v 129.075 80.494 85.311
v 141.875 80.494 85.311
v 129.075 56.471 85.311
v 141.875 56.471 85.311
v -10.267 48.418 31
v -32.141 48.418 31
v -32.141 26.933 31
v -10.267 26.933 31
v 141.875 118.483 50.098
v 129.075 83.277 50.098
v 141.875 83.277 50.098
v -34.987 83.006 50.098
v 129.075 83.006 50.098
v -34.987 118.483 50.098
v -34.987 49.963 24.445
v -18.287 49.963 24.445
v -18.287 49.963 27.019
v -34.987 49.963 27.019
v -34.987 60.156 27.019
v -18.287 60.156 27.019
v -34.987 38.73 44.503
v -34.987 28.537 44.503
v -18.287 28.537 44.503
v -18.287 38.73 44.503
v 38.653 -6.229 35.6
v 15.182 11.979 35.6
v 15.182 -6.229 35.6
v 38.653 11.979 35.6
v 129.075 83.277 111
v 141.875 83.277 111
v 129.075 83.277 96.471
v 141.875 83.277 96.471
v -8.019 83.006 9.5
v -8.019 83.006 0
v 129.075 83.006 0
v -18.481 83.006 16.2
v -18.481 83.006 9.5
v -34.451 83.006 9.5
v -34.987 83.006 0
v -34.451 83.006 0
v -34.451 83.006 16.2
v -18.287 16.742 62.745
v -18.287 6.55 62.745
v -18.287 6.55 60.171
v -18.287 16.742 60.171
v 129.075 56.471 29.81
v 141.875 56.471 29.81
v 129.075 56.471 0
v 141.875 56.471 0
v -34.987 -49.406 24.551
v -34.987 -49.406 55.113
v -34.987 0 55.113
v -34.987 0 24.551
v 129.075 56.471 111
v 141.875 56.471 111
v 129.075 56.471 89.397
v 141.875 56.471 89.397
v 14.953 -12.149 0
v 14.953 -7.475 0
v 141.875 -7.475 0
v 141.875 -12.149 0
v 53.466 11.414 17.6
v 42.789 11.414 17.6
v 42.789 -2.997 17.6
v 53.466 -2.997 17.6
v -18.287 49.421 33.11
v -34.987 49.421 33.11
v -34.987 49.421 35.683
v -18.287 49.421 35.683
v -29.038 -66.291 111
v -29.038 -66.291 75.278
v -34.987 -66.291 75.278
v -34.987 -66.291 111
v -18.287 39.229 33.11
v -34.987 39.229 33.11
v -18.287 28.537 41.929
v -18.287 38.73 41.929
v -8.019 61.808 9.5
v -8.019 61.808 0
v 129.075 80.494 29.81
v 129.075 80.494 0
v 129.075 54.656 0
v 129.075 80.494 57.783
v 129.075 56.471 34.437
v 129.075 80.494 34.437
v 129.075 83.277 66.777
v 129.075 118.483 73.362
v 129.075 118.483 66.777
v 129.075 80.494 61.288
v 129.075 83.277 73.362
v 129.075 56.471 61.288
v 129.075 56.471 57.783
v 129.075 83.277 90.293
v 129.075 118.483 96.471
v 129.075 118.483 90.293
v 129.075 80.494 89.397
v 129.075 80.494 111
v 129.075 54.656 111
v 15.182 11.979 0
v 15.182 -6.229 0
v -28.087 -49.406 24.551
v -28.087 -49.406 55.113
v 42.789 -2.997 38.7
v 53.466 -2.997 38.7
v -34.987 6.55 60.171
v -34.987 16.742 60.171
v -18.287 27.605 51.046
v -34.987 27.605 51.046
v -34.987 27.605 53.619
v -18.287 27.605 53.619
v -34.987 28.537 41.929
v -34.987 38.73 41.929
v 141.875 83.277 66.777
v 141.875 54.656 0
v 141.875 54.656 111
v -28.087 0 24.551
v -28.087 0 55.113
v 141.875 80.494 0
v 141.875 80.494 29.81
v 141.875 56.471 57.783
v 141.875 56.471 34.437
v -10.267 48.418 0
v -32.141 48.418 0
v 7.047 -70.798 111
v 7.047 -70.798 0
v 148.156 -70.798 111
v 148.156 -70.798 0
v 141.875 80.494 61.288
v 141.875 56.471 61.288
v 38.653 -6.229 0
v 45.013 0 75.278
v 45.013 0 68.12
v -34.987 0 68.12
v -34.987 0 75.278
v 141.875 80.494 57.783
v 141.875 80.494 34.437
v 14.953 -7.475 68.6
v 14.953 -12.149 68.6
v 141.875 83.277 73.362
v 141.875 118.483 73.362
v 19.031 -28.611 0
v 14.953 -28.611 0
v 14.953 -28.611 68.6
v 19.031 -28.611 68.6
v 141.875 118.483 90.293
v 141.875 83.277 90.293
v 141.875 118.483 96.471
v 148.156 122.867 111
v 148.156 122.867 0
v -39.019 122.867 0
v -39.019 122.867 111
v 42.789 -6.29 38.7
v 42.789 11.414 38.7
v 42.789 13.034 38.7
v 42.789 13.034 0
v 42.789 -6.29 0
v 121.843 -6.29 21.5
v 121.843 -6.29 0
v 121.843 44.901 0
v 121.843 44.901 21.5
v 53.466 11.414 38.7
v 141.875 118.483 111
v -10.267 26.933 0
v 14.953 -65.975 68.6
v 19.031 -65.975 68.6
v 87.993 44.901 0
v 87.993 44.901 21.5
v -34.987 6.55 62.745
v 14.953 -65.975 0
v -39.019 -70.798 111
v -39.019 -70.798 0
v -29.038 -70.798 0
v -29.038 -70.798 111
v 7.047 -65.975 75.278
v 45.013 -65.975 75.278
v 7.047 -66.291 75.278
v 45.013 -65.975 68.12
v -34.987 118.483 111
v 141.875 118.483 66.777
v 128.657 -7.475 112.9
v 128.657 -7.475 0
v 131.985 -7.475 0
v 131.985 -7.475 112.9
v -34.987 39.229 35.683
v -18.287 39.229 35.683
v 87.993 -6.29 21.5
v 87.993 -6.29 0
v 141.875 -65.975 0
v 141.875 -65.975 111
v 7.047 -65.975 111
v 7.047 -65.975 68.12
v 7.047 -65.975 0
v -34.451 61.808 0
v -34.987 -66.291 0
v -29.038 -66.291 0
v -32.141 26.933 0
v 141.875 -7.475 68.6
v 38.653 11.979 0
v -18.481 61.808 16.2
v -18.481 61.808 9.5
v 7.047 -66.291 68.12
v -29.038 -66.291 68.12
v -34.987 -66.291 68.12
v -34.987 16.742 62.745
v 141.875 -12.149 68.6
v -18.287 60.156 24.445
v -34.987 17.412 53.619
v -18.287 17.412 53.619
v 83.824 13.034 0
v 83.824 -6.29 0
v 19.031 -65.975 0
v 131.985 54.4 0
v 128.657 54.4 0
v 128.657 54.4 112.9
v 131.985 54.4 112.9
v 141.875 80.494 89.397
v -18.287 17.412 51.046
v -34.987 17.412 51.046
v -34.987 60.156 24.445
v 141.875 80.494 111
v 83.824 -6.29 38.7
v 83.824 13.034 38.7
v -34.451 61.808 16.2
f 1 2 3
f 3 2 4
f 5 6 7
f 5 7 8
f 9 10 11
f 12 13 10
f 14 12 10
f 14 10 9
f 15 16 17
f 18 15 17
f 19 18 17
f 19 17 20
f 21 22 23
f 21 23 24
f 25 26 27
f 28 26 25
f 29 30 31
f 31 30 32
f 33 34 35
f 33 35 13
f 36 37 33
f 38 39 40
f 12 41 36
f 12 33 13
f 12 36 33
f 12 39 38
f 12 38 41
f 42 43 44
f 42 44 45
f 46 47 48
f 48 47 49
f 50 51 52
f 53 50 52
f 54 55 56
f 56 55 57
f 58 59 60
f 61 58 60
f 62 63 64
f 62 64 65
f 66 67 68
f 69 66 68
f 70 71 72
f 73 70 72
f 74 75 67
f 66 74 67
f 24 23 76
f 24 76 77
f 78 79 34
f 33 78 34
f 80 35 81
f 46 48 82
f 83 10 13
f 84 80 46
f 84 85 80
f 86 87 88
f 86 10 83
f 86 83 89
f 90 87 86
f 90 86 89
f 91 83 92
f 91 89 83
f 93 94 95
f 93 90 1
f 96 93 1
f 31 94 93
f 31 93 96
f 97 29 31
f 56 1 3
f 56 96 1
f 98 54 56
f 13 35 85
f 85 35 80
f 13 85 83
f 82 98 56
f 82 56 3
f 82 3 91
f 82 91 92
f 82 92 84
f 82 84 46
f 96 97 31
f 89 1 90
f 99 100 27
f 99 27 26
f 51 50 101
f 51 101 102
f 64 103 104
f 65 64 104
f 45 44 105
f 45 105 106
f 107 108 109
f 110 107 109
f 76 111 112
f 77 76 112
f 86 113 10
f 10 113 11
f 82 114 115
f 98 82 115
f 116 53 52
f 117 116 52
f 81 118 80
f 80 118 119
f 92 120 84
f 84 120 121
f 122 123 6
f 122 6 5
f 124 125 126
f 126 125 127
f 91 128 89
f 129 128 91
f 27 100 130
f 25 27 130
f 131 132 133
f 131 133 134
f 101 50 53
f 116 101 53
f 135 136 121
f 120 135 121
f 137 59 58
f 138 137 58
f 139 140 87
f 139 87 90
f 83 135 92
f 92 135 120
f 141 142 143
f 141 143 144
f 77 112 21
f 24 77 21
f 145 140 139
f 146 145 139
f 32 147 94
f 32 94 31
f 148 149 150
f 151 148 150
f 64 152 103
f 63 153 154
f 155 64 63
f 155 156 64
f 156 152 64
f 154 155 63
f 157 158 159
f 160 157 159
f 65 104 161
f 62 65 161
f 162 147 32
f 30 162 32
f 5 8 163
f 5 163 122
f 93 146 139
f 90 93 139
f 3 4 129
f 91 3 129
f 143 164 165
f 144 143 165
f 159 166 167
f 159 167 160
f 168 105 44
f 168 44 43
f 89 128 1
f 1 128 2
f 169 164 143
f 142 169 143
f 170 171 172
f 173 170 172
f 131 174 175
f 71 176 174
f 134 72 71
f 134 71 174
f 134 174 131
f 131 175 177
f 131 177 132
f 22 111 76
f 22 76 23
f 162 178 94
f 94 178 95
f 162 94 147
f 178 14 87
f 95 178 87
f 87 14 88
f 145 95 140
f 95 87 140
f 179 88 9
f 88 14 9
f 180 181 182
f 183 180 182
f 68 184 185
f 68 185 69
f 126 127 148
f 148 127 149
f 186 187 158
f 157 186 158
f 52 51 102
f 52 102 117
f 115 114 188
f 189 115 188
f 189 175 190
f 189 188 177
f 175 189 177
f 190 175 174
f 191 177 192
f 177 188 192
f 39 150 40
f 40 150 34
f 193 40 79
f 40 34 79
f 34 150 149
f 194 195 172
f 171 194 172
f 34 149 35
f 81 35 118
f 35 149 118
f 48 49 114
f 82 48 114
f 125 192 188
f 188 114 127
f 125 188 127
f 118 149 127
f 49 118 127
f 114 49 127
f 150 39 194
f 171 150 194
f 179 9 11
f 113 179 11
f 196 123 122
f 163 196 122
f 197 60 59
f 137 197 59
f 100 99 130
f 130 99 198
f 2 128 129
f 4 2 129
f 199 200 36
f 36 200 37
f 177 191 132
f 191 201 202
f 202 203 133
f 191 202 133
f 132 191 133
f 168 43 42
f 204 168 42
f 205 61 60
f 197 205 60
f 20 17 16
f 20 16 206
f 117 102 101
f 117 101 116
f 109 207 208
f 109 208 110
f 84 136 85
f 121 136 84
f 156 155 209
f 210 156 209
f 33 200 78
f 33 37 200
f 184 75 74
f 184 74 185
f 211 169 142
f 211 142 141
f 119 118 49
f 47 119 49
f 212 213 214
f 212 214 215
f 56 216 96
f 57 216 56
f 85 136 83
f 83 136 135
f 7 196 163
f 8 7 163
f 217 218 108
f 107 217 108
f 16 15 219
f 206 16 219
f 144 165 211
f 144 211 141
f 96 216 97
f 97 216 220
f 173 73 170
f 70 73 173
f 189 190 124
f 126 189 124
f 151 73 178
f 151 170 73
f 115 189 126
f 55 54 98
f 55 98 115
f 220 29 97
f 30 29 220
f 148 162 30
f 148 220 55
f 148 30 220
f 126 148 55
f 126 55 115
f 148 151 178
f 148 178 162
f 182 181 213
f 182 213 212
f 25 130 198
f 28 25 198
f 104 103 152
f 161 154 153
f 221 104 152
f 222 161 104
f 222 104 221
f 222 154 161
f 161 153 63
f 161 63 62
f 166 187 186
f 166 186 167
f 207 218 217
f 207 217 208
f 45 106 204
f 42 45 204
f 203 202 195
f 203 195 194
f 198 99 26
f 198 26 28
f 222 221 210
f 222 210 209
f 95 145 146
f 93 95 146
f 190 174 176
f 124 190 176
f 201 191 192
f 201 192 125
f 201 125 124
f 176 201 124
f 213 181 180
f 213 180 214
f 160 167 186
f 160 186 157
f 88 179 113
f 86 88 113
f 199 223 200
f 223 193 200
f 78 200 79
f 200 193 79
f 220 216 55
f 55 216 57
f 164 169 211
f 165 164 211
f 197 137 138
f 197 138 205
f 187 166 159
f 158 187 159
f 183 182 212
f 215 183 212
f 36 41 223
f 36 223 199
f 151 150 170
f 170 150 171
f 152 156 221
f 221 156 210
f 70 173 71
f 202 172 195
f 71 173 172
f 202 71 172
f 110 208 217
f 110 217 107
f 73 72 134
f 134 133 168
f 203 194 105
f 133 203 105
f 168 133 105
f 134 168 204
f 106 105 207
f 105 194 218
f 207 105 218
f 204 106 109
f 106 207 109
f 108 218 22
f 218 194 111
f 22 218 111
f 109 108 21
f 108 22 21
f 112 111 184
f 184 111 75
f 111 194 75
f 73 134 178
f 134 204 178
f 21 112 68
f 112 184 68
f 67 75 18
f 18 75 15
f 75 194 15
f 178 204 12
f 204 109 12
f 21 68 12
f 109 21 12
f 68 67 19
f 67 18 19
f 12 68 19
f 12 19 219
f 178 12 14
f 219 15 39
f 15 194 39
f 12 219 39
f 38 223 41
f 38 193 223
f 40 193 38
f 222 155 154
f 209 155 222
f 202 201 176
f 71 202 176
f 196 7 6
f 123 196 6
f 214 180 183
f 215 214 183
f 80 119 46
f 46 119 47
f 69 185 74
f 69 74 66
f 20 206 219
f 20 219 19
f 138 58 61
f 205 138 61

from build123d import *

# Parameters (mm, degrees)
F1_DEPTH  = 111
F2_W      = 66.2911757827
F2_H      = 7.1583017707
F3_DEPTH  = 80
F4_W      = 33.8499044473
F4_H      = 51.190990489
F5_DEPTH  = 21.5
F4_W_2    = 41.0357561548
F4_H_2    = 19.3237248852
F6_DEPTH  = 38.7
F2_W_2    = 49.4063384831
F2_H_2    = 30.5613465607
F7_DEPTH  = 6.9
F2_W_3    = 35.4777190369
F2_H_3    = 50.0976517797
F8_DEPTH  = 177
F9_W      = 35.2059740108
F9_H      = 6.5847709775
F9_H_2    = 6.1777755618
F9_W_2    = 24.0235412493
F9_H_3    = 4.6266447753
F9_H_4    = 3.5054106265
F9_H_5    = 4.0854457766
F10_DEPTH = 12.8
F0_W      = 3.3271610737
F0_H      = 61.8747617118
F11_DEPTH = 112.9
F12_DEPTH = 68.6
F0_W_2    = 4.0784408338
F0_H_2    = 37.3633932322
F2_W_4    = 10.1927583568
F2_H_4    = 2.573677036
F13_DEPTH = 16.7
F4_W_3    = 21.8747425824
F4_H_3    = 21.4845836163
F14_DEPTH = 31
F15_DEPTH = 9.5
F16_W     = 15.9703567624
F16_H     = 21.1976245046
F17_DEPTH = 6.7
F4_W_4    = 23.4713996761
F4_H_4    = 18.2081488892
F18_DEPTH = 35.6
F19_W     = 16.7799182236
F19_H     = 14.4109842367
F20_DEPTH = 21.1


with BuildPart() as f1:
    # F0 (on Top) → F1 (new body)
    with BuildSketch(Plane.XY):
        Polygon((-39.0192046762, -70.7977563143), (-29.0382634848, -70.7977563143), (-29.0382634848, -66.2911757827), (-34.9868237972, -66.2911757827), (-34.9868237972, 118.4833857697), (141.8753154576, 118.4833857697), (141.8753154576, -7.4747162871), (141.8753154576, -12.1487416327), (141.8753154576, -65.9745484591), (19.0313281491, -65.9745484591), (14.9528873153, -65.9745484591), (7.0473095402, -65.9745484591), (7.0473095402, -70.7977563143), (148.1556966901, -70.7977563143), (148.1556966901, 122.8667423129), (-39.0192046762, 122.8667423129), align=None)
    extrude(amount=F1_DEPTH)

    # F2 (on face) → F3 (join)
    with BuildSketch(Plane.YZ.offset(-34.9868237972)):
        with Locations((-33.1455878913, 71.698885411)):
            Rectangle(F2_W, F2_H)
    extrude(amount=F3_DEPTH)

    # F2 (on face) → F8 (join)
    with BuildSketch(Plane.YZ.offset(-34.9868237972)):
        with Locations((100.7445262512, 25.0488258898)):
            Rectangle(F2_W_3, F2_H_3)
    extrude(amount=F8_DEPTH)

    # F9 (on face) → F10 (join)
    with BuildSketch(Plane(origin=(141.8753154576, 0, 0), x_dir=(0, -1, 0), z_dir=(-1, 0, 0))):
        with Locations((-100.8803987643, 70.0691230595)):
            Rectangle(F9_W, F9_H)
        with Locations((-100.8803987643, 93.3822579682)):
            Rectangle(F9_W, F9_H_2)
        with Locations((-68.4825261123, 32.1233579889)):
            Rectangle(F9_W_2, F9_H_3)
        with Locations((-68.4825261123, 59.535395354)):
            Rectangle(F9_W_2, F9_H_4)
        with Locations((-68.4825261123, 87.3538330197)):
            Rectangle(F9_W_2, F9_H_5)
        Polygon((-83.0056667328, 0), (-80.494296737, 0), (-80.494296737, 29.8100356013), (-80.494296737, 34.4366803765), (-80.494296737, 57.7826900408), (-80.494296737, 61.2881006673), (-80.494296737, 85.3111101314), (-80.494296737, 89.396555908), (-80.494296737, 111), (-83.2774117589, 111), (-83.2774117589, 96.4711457491), (-83.2774117589, 90.2933701873), (-83.2774117589, 73.3615085483), (-83.2774117589, 66.7767375708), (-83.2774117589, 50.0976517797), (-83.0056667328, 50.0976517797), align=None)
        Polygon((-56.4707554877, 0), (-54.6564869583, 0), (-54.6564869583, 111), (-56.4707554877, 111), (-56.4707554877, 89.396555908), (-56.4707554877, 85.3111101314), (-56.4707554877, 61.2881006673), (-56.4707554877, 57.7826900408), (-56.4707554877, 34.4366803765), (-56.4707554877, 29.8100356013), align=None)
    extrude(amount=F10_DEPTH)

    # F2 (on face) → F13 (join)
    with BuildSketch(Plane.YZ.offset(-34.9868237972)):
        with Locations((11.6460346852, 61.4578317269)):
            Rectangle(F2_W_4, F2_H_4)
        with Locations((22.5085848942, 52.332457155)):
            Rectangle(F2_W_4, F2_H_4)
        with Locations((33.6336530745, 43.2157292962)):
            Rectangle(F2_W_4, F2_H_4)
        with Locations((44.3251021206, 34.3965180218)):
            Rectangle(F2_W_4, F2_H_4)
        with Locations((55.0593063235, 25.7322858088)):
            Rectangle(F2_W_4, F2_H_4)
    extrude(amount=F13_DEPTH)

    # F0 (on Top) → F15 (join)
    with BuildSketch(Plane.XY):
        Polygon((-8.019303903, 83.3232104778), (-34.4510264695, 83.3232104778), (-34.4510264695, 61.8080422282), (-23.7644277513, 61.8080422282), (-8.019303903, 61.8080422282), align=None)
    extrude(amount=F15_DEPTH)

    # F16 (on face) → F17 (join)
    with BuildSketch(Plane.XY.offset(9.5)):
        with Locations((-26.4658480883, 72.4068544805)):
            Rectangle(F16_W, F16_H)
    extrude(amount=F17_DEPTH)


with BuildPart() as f5:
    # F4 (on Top) → F5 (new body)
    with BuildSketch(Plane.XY):
        with Locations((104.9176470698, 19.3053778683)):
            Rectangle(F4_W, F4_H)
    extrude(amount=F5_DEPTH)


with BuildPart() as f6:
    # F4 (on Top) → F6 (new body)
    with BuildSketch(Plane.XY):
        with Locations((63.3065112228, 3.3717450664)):
            Rectangle(F4_W_2, F4_H_2)
    extrude(amount=F6_DEPTH)

    # F19 (on face) → F20 (cut)
    with BuildSketch(Plane.XY.offset(38.7)):
        with Locations((45.0764577836, 4.2080634739)):
            Rectangle(F19_W, F19_H)
    extrude(amount=-F20_DEPTH, mode=Mode.SUBTRACT)


with BuildPart() as f7:
    # F2 (on face) → F7 (new body)
    with BuildSketch(Plane.YZ.offset(-34.9868237972)):
        with Locations((-24.7031692415, 39.8319084197)):
            Rectangle(F2_W_2, F2_H_2)
    extrude(amount=F7_DEPTH)


with BuildPart() as f11:
    # F0 (on Top) → F11 (new body)
    with BuildSketch(Plane.XY):
        with Locations((130.3210556507, 23.4626645688)):
            Rectangle(F0_W, F0_H)
    extrude(amount=F11_DEPTH)


with BuildPart() as f12:
    # F0 (on Top) → F12 (new body)
    with BuildSketch(Plane.XY):
        Polygon((141.8753154576, -12.1487416327), (141.8753154576, -7.4747162871), (131.9846361876, -7.4747162871), (128.6574751139, -7.4747162871), (14.9528873153, -7.4747162871), (14.9528873153, -12.1487416327), align=None)
    extrude(amount=F12_DEPTH)


with BuildPart() as f12b:
    # F0 (on Top) → F12, piece 2 (new body)
    with BuildSketch(Plane.XY):
        with Locations((16.9921077322, -47.2928518429)):
            Rectangle(F0_W_2, F0_H_2)
    extrude(amount=F12_DEPTH)


with BuildPart() as f14:
    # F4 (on Top) → F14 (new body)
    with BuildSketch(Plane.XY):
        with Locations((-21.203934215, 37.6756563783)):
            Rectangle(F4_W_3, F4_H_3)
    extrude(amount=F14_DEPTH)


with BuildPart() as f18:
    # F4 (on Top) → F18 (new body)
    with BuildSketch(Plane.XY):
        with Locations((26.9174149726, 2.8752870858)):
            Rectangle(F4_W_4, F4_H_4)
    extrude(amount=F18_DEPTH)


solid = Compound([f1.part, f5.part, f6.part, f7.part, f11.part, f12.part, f12b.part, f14.part, f18.part])
